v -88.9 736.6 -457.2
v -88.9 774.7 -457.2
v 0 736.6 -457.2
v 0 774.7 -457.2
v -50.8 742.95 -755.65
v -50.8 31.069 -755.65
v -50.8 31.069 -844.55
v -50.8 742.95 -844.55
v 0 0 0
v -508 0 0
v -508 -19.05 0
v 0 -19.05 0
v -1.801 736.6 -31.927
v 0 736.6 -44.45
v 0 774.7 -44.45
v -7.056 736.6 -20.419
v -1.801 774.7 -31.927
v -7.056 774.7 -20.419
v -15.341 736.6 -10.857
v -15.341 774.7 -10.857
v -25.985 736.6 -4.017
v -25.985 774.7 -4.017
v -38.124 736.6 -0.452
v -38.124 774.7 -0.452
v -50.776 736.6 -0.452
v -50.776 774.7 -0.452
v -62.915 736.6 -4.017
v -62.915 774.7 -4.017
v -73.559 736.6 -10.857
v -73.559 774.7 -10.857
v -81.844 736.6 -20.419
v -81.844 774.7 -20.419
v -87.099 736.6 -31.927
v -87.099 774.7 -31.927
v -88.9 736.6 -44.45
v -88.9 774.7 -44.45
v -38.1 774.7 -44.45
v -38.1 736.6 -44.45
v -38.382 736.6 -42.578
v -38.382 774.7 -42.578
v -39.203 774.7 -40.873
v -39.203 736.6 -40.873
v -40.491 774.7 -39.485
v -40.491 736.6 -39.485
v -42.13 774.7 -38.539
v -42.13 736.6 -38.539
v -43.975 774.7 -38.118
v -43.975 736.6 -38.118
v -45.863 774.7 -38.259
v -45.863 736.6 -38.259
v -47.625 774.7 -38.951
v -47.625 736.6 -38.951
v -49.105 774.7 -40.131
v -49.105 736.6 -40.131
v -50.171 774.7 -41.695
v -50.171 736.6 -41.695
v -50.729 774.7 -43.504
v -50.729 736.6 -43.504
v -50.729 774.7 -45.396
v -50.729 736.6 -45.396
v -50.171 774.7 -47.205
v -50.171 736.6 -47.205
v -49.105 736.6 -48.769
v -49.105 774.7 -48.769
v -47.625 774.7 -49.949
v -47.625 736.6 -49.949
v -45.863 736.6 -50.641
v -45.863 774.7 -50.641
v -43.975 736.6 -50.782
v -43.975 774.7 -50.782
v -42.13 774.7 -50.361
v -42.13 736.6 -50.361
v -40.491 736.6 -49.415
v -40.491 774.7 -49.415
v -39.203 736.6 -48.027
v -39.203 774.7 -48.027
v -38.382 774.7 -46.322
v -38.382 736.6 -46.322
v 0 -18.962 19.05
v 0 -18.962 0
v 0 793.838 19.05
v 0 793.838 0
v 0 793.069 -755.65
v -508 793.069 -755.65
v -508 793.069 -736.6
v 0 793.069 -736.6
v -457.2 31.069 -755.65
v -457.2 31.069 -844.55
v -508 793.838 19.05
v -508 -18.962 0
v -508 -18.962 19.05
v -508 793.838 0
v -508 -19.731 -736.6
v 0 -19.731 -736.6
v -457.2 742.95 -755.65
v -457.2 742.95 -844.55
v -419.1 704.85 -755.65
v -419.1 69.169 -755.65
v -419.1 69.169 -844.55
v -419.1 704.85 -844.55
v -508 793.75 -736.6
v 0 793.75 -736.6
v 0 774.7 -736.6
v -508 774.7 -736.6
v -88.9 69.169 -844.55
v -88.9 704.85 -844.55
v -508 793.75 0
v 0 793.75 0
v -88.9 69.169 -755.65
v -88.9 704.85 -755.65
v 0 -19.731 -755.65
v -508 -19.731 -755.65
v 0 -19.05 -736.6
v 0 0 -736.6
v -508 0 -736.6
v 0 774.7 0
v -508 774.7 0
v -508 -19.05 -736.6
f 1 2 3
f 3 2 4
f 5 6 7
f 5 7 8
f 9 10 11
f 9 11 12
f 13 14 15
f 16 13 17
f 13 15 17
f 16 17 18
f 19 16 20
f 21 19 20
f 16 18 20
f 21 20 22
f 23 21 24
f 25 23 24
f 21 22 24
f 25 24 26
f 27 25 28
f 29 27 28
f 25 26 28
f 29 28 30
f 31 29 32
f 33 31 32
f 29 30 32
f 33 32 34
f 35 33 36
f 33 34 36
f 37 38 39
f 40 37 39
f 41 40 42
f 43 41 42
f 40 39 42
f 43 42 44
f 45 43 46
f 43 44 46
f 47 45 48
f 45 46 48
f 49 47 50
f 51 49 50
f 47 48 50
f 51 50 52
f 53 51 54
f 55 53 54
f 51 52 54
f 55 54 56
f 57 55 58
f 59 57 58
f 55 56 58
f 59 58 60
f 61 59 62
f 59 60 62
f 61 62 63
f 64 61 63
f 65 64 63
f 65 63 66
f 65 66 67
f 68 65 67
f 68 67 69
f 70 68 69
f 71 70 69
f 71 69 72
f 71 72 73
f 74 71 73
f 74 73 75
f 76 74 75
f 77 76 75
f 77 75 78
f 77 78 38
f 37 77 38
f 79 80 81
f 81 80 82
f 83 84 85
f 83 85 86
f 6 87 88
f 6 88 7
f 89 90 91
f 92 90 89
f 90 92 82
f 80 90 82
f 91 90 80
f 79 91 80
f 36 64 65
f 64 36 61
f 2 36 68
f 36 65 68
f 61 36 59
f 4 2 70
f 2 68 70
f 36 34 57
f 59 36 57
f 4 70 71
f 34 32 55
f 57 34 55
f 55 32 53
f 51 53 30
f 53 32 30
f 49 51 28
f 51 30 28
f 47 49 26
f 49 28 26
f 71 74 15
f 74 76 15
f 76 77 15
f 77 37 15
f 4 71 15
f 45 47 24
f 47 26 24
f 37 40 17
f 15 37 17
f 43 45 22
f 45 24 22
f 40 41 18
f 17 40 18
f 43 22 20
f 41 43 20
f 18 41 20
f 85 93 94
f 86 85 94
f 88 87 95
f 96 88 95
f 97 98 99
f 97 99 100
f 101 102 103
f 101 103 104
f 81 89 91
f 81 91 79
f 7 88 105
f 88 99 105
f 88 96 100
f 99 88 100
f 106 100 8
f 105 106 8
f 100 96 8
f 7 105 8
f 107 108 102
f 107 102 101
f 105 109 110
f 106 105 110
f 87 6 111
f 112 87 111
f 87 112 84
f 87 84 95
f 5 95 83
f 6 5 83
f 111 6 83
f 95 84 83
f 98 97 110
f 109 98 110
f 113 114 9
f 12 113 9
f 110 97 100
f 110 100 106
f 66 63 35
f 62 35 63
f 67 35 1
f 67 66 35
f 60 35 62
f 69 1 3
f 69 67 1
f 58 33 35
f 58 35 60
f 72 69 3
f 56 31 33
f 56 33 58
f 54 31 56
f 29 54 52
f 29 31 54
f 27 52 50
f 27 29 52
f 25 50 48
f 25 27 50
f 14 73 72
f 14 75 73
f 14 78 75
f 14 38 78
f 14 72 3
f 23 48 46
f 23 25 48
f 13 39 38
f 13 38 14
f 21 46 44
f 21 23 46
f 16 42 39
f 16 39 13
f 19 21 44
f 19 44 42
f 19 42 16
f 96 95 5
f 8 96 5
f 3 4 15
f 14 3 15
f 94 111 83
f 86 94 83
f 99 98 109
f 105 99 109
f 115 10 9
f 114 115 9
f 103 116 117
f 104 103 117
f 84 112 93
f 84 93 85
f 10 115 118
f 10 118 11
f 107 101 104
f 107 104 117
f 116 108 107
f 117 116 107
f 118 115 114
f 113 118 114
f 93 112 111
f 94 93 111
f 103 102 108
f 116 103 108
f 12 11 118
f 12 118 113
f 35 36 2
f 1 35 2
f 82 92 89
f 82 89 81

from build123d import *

# Parameters (mm, degrees)
F0_W      = 508
F0_H      = 736.6
F1_DEPTH  = 19.05
F4_W      = 508
F4_H      = 736.6
F5_DEPTH  = 19.05
F6_W      = 508
F6_H      = 812.8
F7_DEPTH  = 19.05
F8_W      = 508
F8_H      = 812.8
F9_DEPTH  = 19.05
F10_W     = 406.4
F10_H     = 711.8805297179
F10_W_2   = 330.2
F10_H_2   = 635.6805297179
F11_DEPTH = 88.9
F14_DEPTH = 38.1
F15_R     = 6.35
F16_DEPTH = 57.2386364558


with BuildPart() as f1:
    # F0 (on Front) → F1 (new body)
    with BuildSketch(Plane.XZ):
        with Locations((-254, -368.3)):
            Rectangle(F0_W, F0_H)
    extrude(amount=F1_DEPTH)


with BuildPart() as f5:
    # F4 (on offset) → F5 (new body)
    with BuildSketch(Plane(origin=(0, 793.75, 0), x_dir=(-1, 0, 0), z_dir=(0, 1, 0))):
        with Locations((254, -368.3)):
            Rectangle(F4_W, F4_H)
    extrude(amount=-F5_DEPTH)


with BuildPart() as f7:
    # F6 (on Top) → F7 (new body)
    with BuildSketch(Plane.XY):
        with Locations((-254, 387.4376364558)):
            Rectangle(F6_W, F6_H)
    extrude(amount=F7_DEPTH)


with BuildPart() as f9:
    # F8 (on offset) → F9 (new body)
    with BuildSketch(Plane.XY.offset(-755.65)):
        with Locations((-254, 386.6694702821)):
            Rectangle(F8_W, F8_H)
    extrude(amount=F9_DEPTH)

    # F10 (on offset) → F11 (join)
    with BuildSketch(Plane.XY.offset(-755.65)):
        with Locations((-254, 387.009735141)):
            Rectangle(F10_W, F10_H)
        with Locations((-254, 387.009735141)):
            Rectangle(F10_W_2, F10_H_2, mode=Mode.SUBTRACT)
    extrude(amount=-F11_DEPTH)


with BuildPart() as f14:
    # F13 (on offset) → F14 (new body)
    with BuildSketch(Plane.XZ.offset(-774.7)):
        with BuildLine():
            Line((-88.9, -457.2), (0, -457.2))
            Line((0, -457.2), (0, -44.45))
            ThreePointArc((0, -44.45), (-44.45, 0), (-88.9, -44.45))
            Line((-88.9, -44.45), (-88.9, -457.2))
        make_face()
    extrude(amount=F14_DEPTH)

    # F15 (on face) → F16 (cut, through all)
    with BuildSketch(Plane.XZ.offset(-736.6)):
        with Locations((-44.45, -44.45)):
            Circle(F15_R)
    extrude(amount=-F16_DEPTH, mode=Mode.SUBTRACT)


solid = Compound([f1.part, f5.part, f7.part, f9.part, f14.part])
